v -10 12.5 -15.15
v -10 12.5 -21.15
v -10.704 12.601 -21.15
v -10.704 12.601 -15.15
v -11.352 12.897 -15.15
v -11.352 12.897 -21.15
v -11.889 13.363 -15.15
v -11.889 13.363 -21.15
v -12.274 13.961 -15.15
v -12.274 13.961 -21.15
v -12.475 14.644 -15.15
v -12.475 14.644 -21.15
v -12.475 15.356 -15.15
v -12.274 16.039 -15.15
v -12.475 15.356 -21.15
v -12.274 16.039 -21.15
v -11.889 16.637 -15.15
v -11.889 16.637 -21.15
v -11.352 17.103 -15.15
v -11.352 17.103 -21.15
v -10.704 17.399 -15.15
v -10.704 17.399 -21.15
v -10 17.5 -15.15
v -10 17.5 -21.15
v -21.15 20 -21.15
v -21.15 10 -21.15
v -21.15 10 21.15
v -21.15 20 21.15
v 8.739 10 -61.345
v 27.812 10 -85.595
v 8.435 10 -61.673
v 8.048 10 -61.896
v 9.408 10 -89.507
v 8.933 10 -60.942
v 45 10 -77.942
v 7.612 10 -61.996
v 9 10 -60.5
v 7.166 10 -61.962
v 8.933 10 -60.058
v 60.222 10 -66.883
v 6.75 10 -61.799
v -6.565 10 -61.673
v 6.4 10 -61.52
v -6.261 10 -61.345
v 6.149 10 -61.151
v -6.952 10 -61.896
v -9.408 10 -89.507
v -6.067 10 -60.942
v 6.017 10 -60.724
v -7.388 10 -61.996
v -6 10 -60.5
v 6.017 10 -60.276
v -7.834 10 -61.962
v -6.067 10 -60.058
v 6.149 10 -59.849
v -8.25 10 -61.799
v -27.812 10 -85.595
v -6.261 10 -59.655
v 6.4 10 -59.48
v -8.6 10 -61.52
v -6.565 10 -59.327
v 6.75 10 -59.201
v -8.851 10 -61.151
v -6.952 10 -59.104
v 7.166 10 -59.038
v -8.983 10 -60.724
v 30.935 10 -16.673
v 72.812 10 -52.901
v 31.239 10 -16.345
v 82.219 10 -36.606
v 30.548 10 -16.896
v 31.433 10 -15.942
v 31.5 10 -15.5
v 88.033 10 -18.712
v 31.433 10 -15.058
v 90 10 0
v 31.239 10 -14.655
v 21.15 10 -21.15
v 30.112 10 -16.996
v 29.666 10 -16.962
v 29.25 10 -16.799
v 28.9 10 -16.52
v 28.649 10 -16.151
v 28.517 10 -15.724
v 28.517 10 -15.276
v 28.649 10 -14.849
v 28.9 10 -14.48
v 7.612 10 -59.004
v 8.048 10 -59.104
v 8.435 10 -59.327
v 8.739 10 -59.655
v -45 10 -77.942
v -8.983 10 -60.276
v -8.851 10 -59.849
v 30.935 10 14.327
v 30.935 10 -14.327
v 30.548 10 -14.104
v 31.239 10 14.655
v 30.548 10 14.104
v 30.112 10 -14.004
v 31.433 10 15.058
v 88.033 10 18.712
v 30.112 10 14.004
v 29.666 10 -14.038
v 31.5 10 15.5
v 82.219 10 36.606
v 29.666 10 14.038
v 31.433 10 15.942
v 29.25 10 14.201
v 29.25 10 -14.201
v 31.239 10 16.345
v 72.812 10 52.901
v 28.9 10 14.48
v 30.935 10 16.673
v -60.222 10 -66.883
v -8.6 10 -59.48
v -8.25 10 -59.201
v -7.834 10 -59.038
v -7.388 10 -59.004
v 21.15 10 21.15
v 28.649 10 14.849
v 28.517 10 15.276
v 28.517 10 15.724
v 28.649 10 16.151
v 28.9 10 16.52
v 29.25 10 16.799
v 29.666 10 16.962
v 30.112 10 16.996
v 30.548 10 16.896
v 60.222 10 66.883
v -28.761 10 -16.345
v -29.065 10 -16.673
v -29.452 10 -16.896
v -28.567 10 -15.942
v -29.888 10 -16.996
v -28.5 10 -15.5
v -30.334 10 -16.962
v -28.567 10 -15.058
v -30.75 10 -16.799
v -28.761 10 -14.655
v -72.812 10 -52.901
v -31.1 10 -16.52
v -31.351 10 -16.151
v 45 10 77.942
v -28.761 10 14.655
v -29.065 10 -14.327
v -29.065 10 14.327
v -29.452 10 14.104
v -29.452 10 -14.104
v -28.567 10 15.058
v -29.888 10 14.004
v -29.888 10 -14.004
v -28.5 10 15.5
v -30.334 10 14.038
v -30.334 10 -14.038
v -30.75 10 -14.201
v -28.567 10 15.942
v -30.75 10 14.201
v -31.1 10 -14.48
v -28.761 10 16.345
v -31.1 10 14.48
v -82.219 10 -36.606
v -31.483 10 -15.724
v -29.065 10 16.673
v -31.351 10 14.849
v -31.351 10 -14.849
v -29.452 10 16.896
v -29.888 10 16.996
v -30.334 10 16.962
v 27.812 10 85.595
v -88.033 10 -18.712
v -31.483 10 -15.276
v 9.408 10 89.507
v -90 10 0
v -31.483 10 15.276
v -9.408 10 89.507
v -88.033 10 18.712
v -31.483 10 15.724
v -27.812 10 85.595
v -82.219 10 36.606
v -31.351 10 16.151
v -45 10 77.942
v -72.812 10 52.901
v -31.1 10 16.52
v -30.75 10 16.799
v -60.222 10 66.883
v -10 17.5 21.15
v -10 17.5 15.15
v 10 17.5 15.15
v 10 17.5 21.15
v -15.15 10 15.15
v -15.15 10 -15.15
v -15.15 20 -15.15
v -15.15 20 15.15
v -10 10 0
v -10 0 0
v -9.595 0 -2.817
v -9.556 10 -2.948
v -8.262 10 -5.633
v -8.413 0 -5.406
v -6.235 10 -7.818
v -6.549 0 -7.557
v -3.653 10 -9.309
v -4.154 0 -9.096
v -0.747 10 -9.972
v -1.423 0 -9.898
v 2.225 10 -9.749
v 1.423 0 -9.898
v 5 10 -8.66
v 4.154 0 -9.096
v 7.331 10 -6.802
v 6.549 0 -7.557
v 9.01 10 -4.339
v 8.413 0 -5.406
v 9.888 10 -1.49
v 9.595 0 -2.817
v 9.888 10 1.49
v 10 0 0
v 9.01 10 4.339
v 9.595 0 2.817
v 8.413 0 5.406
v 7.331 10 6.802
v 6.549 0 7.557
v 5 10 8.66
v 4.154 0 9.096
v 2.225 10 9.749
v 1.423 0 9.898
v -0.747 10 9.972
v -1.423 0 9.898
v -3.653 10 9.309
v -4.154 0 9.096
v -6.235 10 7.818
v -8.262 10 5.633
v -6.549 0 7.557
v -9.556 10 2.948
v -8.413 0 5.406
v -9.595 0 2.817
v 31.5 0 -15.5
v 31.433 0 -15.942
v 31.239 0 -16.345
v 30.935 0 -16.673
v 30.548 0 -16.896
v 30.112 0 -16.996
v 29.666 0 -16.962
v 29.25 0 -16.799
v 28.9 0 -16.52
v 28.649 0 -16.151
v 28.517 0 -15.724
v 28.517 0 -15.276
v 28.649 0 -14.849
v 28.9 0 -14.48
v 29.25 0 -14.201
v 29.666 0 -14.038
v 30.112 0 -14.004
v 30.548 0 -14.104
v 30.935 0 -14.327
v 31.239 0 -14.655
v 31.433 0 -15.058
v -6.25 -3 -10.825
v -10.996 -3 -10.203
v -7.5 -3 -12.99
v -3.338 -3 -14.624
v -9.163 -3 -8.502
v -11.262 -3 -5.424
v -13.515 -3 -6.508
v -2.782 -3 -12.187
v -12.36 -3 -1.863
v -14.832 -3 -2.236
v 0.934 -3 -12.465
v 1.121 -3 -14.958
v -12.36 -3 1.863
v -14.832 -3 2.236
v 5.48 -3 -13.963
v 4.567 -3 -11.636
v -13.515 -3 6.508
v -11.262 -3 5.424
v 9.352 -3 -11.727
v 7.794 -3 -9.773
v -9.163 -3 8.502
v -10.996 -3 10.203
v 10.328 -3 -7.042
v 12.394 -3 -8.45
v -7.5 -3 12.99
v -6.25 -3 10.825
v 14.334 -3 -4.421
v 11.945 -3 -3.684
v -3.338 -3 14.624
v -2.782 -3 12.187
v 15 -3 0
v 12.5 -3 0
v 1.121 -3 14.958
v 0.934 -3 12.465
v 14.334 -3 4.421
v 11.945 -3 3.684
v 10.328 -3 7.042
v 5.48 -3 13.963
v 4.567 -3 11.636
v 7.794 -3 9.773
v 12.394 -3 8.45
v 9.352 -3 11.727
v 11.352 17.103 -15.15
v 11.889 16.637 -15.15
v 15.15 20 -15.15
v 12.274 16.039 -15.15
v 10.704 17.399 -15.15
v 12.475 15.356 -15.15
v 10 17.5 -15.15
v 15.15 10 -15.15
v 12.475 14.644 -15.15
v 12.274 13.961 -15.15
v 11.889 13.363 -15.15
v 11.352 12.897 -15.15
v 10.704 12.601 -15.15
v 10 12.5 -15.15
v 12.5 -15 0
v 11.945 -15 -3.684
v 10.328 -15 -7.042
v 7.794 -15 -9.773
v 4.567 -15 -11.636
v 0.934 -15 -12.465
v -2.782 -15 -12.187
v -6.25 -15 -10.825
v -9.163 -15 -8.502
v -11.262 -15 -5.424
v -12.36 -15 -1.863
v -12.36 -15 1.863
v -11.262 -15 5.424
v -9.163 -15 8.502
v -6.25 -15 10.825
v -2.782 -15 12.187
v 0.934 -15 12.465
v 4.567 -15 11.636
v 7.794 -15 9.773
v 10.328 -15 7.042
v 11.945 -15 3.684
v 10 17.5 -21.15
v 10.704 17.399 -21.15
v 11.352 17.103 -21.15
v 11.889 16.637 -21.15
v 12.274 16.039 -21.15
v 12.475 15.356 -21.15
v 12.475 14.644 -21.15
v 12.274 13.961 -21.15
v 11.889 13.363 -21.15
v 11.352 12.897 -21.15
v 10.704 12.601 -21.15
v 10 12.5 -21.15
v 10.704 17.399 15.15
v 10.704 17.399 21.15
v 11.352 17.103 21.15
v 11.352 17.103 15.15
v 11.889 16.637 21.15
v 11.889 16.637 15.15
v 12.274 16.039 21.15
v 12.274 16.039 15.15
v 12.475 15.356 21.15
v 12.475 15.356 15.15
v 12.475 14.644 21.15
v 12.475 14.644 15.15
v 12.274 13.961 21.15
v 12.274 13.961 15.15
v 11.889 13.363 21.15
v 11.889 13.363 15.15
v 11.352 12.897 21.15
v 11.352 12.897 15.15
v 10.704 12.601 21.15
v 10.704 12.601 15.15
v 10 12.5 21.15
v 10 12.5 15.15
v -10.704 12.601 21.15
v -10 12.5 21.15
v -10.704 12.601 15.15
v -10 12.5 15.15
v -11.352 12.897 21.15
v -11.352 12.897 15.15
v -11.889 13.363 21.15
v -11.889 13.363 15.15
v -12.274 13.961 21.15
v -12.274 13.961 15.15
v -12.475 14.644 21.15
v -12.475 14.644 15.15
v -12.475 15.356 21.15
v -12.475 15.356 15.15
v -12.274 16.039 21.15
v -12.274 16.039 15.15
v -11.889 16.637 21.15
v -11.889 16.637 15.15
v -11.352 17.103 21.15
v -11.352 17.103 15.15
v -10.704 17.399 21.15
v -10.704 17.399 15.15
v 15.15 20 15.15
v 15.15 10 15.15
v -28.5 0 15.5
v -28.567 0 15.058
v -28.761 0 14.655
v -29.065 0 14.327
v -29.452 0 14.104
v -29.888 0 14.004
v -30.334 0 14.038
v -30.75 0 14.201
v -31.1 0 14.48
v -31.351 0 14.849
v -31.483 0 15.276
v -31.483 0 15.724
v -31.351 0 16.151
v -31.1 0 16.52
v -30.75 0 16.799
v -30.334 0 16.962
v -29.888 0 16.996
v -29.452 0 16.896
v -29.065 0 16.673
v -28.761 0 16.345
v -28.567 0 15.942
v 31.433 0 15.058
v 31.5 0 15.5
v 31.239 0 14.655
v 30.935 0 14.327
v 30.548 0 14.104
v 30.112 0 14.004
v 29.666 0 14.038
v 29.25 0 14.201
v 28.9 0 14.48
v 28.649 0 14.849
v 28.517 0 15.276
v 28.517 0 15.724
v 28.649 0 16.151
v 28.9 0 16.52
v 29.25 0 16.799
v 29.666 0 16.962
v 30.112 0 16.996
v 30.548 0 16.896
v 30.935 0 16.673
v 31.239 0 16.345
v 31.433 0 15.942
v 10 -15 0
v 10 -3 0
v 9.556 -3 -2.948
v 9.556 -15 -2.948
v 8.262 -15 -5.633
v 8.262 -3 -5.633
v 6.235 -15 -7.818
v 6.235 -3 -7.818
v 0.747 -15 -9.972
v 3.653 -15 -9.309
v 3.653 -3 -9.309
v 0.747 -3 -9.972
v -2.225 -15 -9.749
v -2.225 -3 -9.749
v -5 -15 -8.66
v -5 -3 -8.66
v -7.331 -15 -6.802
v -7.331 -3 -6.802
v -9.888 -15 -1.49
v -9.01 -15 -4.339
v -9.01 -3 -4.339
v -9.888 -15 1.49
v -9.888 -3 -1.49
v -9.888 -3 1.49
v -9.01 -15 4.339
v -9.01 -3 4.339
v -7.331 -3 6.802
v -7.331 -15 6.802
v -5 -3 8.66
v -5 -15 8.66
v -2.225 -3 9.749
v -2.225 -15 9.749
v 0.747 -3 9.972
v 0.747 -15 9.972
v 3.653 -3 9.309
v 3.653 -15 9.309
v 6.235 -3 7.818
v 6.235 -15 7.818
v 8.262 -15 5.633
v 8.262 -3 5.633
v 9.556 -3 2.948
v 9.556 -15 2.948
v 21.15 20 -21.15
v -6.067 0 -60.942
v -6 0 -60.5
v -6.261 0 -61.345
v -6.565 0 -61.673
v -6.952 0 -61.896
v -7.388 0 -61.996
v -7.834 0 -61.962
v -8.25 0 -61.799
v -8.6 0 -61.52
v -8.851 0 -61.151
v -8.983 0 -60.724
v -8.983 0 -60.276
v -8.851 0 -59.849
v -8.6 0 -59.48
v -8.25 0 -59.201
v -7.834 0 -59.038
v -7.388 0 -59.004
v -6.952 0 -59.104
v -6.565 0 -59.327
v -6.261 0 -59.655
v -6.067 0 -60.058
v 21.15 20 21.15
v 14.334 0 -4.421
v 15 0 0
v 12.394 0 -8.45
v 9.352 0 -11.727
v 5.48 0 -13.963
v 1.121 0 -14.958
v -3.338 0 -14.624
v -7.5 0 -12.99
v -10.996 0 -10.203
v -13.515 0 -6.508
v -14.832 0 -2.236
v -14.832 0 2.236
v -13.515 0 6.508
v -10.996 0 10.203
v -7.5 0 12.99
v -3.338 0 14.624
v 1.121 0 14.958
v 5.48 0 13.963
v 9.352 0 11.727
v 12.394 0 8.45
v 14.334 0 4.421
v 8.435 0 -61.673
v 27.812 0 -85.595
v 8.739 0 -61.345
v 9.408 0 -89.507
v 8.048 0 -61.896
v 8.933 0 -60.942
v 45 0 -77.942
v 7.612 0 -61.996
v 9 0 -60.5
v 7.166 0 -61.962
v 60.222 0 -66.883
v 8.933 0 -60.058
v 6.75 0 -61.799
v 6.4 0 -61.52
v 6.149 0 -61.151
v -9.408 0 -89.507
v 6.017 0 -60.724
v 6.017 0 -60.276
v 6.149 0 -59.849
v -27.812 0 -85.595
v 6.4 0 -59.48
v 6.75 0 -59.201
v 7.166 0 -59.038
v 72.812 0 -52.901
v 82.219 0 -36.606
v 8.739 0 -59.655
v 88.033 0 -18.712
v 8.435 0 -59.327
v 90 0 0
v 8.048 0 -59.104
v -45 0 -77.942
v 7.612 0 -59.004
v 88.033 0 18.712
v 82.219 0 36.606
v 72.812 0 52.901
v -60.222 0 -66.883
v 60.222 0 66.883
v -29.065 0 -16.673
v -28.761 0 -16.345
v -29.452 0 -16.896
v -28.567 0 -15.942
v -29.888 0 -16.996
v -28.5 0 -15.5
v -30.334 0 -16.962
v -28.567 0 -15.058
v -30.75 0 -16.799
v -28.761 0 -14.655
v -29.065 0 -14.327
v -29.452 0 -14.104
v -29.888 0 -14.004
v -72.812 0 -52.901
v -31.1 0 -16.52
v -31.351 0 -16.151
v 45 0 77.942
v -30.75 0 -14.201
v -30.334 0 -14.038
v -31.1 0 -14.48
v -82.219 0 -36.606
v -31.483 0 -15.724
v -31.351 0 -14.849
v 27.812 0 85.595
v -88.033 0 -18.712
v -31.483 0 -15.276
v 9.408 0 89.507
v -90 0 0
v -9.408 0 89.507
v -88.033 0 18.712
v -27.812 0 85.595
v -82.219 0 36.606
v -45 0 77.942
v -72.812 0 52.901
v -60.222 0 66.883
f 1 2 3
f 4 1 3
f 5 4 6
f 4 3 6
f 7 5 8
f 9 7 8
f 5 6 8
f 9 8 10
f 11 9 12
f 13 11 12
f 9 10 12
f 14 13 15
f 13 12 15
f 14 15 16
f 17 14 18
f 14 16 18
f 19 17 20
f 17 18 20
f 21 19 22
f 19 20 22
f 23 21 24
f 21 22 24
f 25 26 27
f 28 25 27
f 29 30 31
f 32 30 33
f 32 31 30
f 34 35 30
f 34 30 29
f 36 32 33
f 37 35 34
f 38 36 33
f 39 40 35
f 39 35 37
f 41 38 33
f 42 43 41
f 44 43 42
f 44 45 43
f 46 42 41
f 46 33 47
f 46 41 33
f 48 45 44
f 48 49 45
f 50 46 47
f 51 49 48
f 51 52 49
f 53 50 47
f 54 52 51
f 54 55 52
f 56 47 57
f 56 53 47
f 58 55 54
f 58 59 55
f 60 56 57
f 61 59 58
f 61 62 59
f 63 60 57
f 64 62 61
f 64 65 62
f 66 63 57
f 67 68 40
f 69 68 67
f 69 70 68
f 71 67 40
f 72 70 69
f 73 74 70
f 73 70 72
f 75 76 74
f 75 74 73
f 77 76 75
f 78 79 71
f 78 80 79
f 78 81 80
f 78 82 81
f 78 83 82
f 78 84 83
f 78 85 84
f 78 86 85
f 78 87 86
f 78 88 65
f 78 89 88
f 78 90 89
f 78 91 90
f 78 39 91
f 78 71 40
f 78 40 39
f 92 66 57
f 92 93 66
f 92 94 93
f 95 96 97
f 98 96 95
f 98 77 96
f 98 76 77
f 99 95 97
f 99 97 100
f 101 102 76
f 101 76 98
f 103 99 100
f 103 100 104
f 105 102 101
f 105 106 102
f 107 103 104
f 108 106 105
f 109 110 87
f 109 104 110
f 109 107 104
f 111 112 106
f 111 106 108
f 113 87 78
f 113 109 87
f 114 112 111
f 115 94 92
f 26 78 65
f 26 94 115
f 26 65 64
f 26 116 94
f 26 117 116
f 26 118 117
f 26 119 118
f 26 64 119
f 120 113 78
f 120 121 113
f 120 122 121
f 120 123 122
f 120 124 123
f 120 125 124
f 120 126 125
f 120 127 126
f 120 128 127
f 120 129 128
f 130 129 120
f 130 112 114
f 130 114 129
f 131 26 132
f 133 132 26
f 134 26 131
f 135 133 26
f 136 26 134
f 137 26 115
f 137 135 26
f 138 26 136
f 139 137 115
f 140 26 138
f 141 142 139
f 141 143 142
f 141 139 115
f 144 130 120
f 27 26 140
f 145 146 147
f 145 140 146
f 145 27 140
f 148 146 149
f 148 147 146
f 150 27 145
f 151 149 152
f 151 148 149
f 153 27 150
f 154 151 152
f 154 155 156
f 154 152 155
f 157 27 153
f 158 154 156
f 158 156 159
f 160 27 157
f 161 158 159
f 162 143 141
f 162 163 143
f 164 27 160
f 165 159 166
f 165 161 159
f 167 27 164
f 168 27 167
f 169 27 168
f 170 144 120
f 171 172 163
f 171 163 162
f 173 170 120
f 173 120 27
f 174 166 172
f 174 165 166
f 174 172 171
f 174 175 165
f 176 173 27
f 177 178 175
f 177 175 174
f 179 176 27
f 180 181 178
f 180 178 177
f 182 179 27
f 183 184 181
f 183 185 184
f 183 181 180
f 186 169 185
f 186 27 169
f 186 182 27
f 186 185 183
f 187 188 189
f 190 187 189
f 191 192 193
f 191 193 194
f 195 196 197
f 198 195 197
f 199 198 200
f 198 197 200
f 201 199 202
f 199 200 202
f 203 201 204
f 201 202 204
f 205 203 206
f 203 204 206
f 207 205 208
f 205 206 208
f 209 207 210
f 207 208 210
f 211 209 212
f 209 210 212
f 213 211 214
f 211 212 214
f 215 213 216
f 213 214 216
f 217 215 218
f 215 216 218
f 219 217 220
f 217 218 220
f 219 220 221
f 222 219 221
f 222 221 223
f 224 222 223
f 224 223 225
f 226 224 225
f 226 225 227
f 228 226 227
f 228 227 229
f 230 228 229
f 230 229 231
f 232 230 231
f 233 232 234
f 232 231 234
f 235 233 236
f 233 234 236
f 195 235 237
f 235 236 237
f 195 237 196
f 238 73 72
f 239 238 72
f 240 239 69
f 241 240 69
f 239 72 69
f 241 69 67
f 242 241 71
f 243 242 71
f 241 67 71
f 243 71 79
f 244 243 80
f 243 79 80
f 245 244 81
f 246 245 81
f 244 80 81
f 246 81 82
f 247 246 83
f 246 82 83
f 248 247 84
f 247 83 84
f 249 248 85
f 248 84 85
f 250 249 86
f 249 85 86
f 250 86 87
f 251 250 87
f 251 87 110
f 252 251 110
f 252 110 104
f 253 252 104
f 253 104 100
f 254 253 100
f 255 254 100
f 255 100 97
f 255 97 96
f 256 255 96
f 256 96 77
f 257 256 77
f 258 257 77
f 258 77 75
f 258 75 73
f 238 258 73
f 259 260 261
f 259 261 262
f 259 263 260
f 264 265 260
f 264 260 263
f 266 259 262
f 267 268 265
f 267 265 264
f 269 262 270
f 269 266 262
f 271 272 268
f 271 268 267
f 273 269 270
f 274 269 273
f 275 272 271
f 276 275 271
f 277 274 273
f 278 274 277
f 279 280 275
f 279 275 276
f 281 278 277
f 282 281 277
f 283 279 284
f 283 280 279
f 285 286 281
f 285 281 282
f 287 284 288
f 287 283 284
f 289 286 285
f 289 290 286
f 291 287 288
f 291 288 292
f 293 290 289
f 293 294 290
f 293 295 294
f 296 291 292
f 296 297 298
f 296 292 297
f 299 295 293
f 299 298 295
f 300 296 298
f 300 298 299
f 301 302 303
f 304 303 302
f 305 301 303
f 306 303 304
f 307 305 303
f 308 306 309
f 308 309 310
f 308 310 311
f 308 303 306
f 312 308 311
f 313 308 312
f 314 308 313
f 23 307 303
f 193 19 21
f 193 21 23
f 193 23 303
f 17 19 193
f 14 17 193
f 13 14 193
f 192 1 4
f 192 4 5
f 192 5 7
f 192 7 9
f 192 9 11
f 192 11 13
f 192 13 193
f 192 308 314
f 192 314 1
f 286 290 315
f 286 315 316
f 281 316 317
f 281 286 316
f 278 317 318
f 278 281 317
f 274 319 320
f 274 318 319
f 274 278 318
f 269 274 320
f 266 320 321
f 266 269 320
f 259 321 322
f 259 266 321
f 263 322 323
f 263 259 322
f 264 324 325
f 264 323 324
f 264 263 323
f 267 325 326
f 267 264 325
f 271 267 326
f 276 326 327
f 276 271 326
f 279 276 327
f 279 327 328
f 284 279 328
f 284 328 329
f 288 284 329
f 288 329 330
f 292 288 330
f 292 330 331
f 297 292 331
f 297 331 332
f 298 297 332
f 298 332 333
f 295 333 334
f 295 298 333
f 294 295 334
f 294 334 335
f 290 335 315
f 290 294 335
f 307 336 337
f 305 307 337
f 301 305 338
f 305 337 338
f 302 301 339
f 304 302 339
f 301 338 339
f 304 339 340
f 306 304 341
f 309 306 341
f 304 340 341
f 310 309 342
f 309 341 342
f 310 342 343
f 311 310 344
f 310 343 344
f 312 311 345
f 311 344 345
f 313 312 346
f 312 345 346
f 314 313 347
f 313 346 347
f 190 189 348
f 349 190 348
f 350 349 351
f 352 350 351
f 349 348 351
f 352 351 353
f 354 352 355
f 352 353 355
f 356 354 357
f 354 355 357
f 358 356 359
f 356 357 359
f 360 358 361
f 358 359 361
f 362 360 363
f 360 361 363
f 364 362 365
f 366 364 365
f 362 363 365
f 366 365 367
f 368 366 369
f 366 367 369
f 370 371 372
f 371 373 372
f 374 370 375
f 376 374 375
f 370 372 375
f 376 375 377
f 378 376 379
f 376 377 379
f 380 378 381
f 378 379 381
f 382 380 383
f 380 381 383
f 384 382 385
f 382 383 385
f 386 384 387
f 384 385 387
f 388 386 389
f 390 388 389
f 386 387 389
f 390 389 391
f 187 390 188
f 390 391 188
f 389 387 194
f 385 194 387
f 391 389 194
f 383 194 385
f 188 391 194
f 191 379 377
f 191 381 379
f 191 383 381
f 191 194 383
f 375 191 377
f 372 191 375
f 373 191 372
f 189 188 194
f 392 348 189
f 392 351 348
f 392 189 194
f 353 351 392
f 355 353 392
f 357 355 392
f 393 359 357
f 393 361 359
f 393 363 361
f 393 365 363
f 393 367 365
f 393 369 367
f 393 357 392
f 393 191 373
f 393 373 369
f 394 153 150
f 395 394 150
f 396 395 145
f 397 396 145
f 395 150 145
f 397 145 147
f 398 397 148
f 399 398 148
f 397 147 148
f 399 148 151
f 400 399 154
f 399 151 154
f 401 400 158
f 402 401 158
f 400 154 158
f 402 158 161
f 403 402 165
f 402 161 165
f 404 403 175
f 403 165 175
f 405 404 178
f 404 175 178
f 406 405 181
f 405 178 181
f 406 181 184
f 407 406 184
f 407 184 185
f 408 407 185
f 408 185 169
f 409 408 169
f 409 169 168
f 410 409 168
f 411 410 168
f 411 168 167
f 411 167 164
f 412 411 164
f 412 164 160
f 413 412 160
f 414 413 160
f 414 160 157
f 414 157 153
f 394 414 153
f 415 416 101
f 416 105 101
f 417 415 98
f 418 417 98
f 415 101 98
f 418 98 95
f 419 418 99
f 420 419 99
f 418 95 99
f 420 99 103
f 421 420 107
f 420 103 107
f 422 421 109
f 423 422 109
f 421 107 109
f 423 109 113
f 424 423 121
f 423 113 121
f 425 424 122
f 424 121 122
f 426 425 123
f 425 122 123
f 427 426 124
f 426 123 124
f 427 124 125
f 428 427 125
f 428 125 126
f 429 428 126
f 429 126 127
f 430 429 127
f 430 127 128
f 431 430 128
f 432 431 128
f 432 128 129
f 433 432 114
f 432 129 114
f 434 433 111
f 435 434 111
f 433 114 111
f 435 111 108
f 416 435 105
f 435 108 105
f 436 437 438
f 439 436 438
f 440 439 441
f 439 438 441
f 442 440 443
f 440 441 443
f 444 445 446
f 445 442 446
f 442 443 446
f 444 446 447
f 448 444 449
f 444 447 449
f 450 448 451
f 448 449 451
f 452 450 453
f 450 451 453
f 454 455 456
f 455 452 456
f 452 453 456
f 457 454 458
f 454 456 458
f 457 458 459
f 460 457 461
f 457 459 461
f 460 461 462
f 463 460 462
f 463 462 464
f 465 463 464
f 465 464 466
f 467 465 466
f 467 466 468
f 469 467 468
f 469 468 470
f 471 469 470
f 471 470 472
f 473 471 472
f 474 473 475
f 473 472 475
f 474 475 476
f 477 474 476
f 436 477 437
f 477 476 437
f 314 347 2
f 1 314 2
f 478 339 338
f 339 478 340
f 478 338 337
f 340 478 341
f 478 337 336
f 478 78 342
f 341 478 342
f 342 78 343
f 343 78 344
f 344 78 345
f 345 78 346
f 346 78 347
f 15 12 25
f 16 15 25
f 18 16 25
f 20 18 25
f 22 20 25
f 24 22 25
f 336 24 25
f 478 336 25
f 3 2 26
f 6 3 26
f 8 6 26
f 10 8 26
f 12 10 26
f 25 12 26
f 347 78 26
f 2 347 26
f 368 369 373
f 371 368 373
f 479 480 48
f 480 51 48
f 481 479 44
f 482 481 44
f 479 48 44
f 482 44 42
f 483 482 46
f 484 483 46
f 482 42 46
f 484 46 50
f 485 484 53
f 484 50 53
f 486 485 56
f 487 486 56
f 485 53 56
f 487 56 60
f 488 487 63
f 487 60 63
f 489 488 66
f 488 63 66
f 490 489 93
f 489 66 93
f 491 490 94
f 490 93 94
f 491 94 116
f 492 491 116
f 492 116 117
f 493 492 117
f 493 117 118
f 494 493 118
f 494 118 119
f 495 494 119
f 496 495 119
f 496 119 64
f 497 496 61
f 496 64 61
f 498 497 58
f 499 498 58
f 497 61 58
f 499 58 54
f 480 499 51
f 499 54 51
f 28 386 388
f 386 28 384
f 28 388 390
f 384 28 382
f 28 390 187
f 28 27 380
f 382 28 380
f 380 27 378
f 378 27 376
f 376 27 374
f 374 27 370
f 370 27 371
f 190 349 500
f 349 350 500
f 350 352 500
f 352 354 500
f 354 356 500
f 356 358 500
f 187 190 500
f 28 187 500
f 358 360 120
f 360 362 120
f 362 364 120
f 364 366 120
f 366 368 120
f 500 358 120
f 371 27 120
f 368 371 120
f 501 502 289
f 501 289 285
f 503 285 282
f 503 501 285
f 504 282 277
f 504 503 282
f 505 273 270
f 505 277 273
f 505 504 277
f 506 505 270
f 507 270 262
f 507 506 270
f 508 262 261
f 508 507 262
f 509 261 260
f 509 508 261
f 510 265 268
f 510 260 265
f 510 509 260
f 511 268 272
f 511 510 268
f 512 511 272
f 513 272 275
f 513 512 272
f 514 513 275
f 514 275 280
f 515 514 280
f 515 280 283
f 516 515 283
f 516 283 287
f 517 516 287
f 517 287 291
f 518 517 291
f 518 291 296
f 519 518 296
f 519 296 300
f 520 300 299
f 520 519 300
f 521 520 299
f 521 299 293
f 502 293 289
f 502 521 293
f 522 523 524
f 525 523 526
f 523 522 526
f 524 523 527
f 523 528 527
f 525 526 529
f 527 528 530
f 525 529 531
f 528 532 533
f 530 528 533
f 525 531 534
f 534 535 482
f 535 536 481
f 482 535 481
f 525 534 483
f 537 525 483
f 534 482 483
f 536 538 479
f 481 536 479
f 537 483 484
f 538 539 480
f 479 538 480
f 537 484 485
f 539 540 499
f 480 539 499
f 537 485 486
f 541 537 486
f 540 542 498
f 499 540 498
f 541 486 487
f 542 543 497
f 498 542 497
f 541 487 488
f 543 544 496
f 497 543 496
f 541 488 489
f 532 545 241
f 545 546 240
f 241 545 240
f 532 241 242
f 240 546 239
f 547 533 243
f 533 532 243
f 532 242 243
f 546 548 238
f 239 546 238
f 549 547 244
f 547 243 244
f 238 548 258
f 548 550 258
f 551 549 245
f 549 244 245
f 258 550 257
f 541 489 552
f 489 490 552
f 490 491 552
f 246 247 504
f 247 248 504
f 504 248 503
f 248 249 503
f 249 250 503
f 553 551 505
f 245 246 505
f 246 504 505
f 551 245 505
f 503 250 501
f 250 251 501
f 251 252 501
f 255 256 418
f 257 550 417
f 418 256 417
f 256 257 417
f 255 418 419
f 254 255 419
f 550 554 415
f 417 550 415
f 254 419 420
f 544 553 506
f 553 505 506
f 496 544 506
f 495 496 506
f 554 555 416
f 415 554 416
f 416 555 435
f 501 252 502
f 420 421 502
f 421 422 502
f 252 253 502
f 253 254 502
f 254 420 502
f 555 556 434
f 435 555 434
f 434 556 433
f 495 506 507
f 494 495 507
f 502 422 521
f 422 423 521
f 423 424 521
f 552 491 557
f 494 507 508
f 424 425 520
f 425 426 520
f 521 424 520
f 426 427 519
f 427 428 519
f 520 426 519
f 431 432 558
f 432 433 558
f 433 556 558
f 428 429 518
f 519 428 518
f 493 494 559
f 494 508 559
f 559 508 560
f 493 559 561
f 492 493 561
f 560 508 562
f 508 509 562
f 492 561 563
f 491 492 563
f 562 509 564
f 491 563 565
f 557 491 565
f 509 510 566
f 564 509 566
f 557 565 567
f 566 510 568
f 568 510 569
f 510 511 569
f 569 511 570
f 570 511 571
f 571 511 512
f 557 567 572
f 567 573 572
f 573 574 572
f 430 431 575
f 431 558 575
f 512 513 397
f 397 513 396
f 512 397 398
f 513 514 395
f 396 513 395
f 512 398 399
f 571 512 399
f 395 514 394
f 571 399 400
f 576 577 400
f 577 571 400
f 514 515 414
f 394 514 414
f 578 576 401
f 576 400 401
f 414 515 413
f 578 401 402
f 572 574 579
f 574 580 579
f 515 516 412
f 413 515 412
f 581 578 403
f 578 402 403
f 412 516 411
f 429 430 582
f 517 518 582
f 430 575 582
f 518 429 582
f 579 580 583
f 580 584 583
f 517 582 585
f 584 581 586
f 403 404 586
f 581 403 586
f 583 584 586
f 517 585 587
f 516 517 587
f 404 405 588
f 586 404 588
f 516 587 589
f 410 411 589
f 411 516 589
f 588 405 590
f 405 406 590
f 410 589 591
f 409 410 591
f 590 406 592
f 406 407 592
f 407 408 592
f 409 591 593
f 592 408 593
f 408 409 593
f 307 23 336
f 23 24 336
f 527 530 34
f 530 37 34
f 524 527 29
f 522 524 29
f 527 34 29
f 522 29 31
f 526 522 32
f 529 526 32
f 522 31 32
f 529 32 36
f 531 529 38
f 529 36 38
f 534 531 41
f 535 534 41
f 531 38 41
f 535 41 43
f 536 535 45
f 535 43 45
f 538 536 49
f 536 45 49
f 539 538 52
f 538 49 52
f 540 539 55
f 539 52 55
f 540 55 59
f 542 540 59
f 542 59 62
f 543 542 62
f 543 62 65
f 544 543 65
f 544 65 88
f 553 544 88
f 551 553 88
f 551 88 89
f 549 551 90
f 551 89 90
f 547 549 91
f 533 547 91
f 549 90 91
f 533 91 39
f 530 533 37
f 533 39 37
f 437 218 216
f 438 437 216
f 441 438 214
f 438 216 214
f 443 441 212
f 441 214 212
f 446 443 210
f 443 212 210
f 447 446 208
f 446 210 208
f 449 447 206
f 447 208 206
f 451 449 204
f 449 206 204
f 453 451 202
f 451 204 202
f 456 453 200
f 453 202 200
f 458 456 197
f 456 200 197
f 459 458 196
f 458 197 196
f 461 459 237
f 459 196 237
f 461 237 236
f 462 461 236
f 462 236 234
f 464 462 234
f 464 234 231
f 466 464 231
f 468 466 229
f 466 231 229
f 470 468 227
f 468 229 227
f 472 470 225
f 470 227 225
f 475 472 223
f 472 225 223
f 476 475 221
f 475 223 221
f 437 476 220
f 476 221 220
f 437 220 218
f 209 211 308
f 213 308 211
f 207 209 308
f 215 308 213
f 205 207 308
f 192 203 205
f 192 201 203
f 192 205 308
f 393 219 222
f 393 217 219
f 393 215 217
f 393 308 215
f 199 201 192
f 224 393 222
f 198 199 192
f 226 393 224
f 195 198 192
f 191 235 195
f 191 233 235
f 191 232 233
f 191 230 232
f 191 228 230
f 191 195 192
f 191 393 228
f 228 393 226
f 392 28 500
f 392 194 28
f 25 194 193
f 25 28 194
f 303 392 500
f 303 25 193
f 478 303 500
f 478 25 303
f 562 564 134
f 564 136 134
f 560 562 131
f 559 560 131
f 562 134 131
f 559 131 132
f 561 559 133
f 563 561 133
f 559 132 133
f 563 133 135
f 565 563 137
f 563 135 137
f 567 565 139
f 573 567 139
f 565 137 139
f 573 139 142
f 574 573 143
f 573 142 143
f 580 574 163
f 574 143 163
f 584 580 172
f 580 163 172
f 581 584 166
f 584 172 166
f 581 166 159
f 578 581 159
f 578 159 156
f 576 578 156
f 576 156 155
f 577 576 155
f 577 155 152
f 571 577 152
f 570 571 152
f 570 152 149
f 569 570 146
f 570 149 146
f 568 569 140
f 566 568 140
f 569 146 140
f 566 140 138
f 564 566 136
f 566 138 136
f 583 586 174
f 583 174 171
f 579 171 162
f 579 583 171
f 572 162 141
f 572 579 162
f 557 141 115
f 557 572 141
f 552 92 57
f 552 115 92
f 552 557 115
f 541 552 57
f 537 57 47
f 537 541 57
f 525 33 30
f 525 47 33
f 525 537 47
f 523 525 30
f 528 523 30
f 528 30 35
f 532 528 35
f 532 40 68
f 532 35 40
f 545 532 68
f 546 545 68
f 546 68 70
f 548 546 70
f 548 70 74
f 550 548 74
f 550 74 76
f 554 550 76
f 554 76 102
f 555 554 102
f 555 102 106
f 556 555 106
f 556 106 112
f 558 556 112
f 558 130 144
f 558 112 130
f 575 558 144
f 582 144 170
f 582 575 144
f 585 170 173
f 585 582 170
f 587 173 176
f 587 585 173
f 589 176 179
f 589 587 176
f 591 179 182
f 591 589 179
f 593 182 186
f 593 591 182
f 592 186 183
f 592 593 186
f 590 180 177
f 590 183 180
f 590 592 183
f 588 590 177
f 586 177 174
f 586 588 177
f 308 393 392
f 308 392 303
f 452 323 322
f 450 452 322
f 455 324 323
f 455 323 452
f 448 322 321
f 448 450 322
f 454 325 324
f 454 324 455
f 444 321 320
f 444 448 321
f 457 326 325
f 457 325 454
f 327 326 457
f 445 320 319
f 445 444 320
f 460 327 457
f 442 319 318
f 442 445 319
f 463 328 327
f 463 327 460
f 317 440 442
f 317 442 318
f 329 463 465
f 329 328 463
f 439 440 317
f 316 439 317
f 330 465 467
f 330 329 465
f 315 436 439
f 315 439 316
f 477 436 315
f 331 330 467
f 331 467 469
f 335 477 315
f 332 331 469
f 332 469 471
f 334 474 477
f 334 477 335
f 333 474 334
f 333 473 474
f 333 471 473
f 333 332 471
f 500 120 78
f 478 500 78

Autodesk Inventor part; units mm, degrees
ref_plane "YZ Plane" through (0, 0, 0) normal (1, 0, 0) x (0, 1, 0)
ref_plane "XZ Plane" through (0, 0, 0) normal (0, 1, 0) x (-1, 0, 0)
ref_plane "XY Plane" through (0, 0, 0) normal (0, 0, 1) x (1, 0, 0)
sketch "Sketch1" plane through (0, 0, 0) normal (0, 1, 0) x (-1, 0, 0)
  circle A0 centre (0, 0) radius 90
  line L0 (21.15, 21.15) -> (-21.15, 21.15) construction
  line L1 (-21.15, 21.15) -> (-21.15, -21.15) construction
  line L2 (-21.15, -21.15) -> (21.15, -21.15) construction
  line L3 (21.15, -21.15) -> (21.15, 21.15) construction
  line L4 (21.15, 21.15) -> (-21.15, -21.15) construction
  line L5 (-21.15, 21.15) -> (21.15, -21.15) construction
  circle A1 centre (0, 0) radius 10
  dimension "d0" = 180
  dimension "d1" = 42.3
  dimension "d2" = 42.3
  dimension "d3" = 20
extrude "Extrusion1" add sketch "Sketch1" along normal blind 10
sketch "Sketch2" plane through (0, 0, 0) normal (0, -1, 0) x (1, 0, 0)
  circle A0 centre (0, 0) radius 15
  circle A1 centre (0, 0) radius 10
  dimension "d6" = 30
  dimension "d7" = 20
extrude "Extrusion2" add sketch "Sketch2" along normal blind 3
sketch "Sketch3" plane through (0, -3, 0) normal (0, -1, 0) x (1, 0, 0)
  circle A0 centre (0, 0) radius 10
  circle A1 centre (0, 0) radius 12.5
  dimension "d10" = 25
  dimension "d11" = 20
extrude "Extrusion3" add sketch "Sketch3" along normal blind 12
sketch "Sketch4" plane through (0, 10, 0) normal (0, 1, 0) x (1, 0, 0)
  line L0 (-21.15, -21.15) -> (21.15, -21.15)
  line L1 (21.15, -21.15) -> (21.15, 21.15)
  line L2 (21.15, 21.15) -> (-21.15, 21.15)
  line L3 (-21.15, 21.15) -> (-21.15, -21.15)
  line L4 (-21.15, -21.15) -> (21.15, 21.15) construction
  line L5 (21.15, -21.15) -> (-21.15, 21.15) construction
  line L6 (-15.15, -15.15) -> (15.15, -15.15)
  line L7 (15.15, -15.15) -> (15.15, 15.15)
  line L8 (15.15, 15.15) -> (-15.15, 15.15)
  line L9 (-15.15, 15.15) -> (-15.15, -15.15)
  line L10 (-15.15, -15.15) -> (15.15, 15.15) construction
  line L11 (15.15, -15.15) -> (-15.15, 15.15) construction
  point P0 (0, 0)
  dimension "d14" = 42.3
  dimension "d15" = 42.3
  dimension "d16" = 6
extrude "Extrusion4" add sketch "Sketch4" along normal blind 10
sketch "Sketch5" plane through (21.15, 10, -21.15) normal (0, 0, -1) x (-1, 0, 0)
  line L0 (11.15, 5) -> (31.15, 5) construction
  line L1 (11.15, 2.5) -> (31.15, 2.5)
  line L2 (31.15, 7.5) -> (11.15, 7.5)
  arc A0 (11.15, 7.5) -> (11.15, 2.5) centre (11.15, 5) ccw
  arc A1 (31.15, 2.5) -> (31.15, 7.5) centre (31.15, 5) ccw
  line L3 (0, 10) -> (42.3, 10) projected
  point P0 (21.15, -10)
  point P1 (21.15, 5)
  dimension "d19" = 5
  dimension "d20" = 20
  dimension "d21" = 2.5
extrude "Extrusion5" cut sketch "Sketch5" against normal through all
sketch "Sketch6" plane through (0, 10, 0) normal (0, 1, 0) x (1, 0, 0)
  circle A0 centre (-30, 15.5) radius 1.5
  line L0 (0, 0) -> (41.4965, 0) construction
  line L1 (0, 0) -> (0, 38.6106) construction
  circle A1 centre (30, 15.5) radius 1.5
  circle A2 centre (-30, -15.5) radius 1.5
  circle A3 centre (30, -15.5) radius 1.5
  line L2 (-9.5, 62.5) -> (9.5, 62.5) construction
  line L3 (9.5, 62.5) -> (9.5, 47.5) construction
  line L4 (9.5, 47.5) -> (-9.5, 47.5) construction
  line L5 (-9.5, 47.5) -> (-9.5, 62.5) construction
  line L6 (-9.5, 62.5) -> (9.5, 47.5) construction
  line L7 (9.5, 62.5) -> (-9.5, 47.5) construction
  circle A4 centre (-7.5, 60.5) radius 1.5
  circle A5 centre (7.5, 60.5) radius 1.5
  point P0 (0, 55)
  dimension "d24" = 3
  dimension "d25" = 30
  dimension "d26" = 15.5
  dimension "d29" = 60
  dimension "d32" = 31
  dimension "d35" = 15
  dimension "d36" = 19
  dimension "d37" = 55
  dimension "d38" = 2
  dimension "d39" = 2
  dimension "d40" = 3
extrude "Extrusion6" cut sketch "Sketch6" against normal through all
equation "\"d2\" = d1"
equation "\"d15\" = d14"
properties part number "Satellite_plate_3DPrint"
